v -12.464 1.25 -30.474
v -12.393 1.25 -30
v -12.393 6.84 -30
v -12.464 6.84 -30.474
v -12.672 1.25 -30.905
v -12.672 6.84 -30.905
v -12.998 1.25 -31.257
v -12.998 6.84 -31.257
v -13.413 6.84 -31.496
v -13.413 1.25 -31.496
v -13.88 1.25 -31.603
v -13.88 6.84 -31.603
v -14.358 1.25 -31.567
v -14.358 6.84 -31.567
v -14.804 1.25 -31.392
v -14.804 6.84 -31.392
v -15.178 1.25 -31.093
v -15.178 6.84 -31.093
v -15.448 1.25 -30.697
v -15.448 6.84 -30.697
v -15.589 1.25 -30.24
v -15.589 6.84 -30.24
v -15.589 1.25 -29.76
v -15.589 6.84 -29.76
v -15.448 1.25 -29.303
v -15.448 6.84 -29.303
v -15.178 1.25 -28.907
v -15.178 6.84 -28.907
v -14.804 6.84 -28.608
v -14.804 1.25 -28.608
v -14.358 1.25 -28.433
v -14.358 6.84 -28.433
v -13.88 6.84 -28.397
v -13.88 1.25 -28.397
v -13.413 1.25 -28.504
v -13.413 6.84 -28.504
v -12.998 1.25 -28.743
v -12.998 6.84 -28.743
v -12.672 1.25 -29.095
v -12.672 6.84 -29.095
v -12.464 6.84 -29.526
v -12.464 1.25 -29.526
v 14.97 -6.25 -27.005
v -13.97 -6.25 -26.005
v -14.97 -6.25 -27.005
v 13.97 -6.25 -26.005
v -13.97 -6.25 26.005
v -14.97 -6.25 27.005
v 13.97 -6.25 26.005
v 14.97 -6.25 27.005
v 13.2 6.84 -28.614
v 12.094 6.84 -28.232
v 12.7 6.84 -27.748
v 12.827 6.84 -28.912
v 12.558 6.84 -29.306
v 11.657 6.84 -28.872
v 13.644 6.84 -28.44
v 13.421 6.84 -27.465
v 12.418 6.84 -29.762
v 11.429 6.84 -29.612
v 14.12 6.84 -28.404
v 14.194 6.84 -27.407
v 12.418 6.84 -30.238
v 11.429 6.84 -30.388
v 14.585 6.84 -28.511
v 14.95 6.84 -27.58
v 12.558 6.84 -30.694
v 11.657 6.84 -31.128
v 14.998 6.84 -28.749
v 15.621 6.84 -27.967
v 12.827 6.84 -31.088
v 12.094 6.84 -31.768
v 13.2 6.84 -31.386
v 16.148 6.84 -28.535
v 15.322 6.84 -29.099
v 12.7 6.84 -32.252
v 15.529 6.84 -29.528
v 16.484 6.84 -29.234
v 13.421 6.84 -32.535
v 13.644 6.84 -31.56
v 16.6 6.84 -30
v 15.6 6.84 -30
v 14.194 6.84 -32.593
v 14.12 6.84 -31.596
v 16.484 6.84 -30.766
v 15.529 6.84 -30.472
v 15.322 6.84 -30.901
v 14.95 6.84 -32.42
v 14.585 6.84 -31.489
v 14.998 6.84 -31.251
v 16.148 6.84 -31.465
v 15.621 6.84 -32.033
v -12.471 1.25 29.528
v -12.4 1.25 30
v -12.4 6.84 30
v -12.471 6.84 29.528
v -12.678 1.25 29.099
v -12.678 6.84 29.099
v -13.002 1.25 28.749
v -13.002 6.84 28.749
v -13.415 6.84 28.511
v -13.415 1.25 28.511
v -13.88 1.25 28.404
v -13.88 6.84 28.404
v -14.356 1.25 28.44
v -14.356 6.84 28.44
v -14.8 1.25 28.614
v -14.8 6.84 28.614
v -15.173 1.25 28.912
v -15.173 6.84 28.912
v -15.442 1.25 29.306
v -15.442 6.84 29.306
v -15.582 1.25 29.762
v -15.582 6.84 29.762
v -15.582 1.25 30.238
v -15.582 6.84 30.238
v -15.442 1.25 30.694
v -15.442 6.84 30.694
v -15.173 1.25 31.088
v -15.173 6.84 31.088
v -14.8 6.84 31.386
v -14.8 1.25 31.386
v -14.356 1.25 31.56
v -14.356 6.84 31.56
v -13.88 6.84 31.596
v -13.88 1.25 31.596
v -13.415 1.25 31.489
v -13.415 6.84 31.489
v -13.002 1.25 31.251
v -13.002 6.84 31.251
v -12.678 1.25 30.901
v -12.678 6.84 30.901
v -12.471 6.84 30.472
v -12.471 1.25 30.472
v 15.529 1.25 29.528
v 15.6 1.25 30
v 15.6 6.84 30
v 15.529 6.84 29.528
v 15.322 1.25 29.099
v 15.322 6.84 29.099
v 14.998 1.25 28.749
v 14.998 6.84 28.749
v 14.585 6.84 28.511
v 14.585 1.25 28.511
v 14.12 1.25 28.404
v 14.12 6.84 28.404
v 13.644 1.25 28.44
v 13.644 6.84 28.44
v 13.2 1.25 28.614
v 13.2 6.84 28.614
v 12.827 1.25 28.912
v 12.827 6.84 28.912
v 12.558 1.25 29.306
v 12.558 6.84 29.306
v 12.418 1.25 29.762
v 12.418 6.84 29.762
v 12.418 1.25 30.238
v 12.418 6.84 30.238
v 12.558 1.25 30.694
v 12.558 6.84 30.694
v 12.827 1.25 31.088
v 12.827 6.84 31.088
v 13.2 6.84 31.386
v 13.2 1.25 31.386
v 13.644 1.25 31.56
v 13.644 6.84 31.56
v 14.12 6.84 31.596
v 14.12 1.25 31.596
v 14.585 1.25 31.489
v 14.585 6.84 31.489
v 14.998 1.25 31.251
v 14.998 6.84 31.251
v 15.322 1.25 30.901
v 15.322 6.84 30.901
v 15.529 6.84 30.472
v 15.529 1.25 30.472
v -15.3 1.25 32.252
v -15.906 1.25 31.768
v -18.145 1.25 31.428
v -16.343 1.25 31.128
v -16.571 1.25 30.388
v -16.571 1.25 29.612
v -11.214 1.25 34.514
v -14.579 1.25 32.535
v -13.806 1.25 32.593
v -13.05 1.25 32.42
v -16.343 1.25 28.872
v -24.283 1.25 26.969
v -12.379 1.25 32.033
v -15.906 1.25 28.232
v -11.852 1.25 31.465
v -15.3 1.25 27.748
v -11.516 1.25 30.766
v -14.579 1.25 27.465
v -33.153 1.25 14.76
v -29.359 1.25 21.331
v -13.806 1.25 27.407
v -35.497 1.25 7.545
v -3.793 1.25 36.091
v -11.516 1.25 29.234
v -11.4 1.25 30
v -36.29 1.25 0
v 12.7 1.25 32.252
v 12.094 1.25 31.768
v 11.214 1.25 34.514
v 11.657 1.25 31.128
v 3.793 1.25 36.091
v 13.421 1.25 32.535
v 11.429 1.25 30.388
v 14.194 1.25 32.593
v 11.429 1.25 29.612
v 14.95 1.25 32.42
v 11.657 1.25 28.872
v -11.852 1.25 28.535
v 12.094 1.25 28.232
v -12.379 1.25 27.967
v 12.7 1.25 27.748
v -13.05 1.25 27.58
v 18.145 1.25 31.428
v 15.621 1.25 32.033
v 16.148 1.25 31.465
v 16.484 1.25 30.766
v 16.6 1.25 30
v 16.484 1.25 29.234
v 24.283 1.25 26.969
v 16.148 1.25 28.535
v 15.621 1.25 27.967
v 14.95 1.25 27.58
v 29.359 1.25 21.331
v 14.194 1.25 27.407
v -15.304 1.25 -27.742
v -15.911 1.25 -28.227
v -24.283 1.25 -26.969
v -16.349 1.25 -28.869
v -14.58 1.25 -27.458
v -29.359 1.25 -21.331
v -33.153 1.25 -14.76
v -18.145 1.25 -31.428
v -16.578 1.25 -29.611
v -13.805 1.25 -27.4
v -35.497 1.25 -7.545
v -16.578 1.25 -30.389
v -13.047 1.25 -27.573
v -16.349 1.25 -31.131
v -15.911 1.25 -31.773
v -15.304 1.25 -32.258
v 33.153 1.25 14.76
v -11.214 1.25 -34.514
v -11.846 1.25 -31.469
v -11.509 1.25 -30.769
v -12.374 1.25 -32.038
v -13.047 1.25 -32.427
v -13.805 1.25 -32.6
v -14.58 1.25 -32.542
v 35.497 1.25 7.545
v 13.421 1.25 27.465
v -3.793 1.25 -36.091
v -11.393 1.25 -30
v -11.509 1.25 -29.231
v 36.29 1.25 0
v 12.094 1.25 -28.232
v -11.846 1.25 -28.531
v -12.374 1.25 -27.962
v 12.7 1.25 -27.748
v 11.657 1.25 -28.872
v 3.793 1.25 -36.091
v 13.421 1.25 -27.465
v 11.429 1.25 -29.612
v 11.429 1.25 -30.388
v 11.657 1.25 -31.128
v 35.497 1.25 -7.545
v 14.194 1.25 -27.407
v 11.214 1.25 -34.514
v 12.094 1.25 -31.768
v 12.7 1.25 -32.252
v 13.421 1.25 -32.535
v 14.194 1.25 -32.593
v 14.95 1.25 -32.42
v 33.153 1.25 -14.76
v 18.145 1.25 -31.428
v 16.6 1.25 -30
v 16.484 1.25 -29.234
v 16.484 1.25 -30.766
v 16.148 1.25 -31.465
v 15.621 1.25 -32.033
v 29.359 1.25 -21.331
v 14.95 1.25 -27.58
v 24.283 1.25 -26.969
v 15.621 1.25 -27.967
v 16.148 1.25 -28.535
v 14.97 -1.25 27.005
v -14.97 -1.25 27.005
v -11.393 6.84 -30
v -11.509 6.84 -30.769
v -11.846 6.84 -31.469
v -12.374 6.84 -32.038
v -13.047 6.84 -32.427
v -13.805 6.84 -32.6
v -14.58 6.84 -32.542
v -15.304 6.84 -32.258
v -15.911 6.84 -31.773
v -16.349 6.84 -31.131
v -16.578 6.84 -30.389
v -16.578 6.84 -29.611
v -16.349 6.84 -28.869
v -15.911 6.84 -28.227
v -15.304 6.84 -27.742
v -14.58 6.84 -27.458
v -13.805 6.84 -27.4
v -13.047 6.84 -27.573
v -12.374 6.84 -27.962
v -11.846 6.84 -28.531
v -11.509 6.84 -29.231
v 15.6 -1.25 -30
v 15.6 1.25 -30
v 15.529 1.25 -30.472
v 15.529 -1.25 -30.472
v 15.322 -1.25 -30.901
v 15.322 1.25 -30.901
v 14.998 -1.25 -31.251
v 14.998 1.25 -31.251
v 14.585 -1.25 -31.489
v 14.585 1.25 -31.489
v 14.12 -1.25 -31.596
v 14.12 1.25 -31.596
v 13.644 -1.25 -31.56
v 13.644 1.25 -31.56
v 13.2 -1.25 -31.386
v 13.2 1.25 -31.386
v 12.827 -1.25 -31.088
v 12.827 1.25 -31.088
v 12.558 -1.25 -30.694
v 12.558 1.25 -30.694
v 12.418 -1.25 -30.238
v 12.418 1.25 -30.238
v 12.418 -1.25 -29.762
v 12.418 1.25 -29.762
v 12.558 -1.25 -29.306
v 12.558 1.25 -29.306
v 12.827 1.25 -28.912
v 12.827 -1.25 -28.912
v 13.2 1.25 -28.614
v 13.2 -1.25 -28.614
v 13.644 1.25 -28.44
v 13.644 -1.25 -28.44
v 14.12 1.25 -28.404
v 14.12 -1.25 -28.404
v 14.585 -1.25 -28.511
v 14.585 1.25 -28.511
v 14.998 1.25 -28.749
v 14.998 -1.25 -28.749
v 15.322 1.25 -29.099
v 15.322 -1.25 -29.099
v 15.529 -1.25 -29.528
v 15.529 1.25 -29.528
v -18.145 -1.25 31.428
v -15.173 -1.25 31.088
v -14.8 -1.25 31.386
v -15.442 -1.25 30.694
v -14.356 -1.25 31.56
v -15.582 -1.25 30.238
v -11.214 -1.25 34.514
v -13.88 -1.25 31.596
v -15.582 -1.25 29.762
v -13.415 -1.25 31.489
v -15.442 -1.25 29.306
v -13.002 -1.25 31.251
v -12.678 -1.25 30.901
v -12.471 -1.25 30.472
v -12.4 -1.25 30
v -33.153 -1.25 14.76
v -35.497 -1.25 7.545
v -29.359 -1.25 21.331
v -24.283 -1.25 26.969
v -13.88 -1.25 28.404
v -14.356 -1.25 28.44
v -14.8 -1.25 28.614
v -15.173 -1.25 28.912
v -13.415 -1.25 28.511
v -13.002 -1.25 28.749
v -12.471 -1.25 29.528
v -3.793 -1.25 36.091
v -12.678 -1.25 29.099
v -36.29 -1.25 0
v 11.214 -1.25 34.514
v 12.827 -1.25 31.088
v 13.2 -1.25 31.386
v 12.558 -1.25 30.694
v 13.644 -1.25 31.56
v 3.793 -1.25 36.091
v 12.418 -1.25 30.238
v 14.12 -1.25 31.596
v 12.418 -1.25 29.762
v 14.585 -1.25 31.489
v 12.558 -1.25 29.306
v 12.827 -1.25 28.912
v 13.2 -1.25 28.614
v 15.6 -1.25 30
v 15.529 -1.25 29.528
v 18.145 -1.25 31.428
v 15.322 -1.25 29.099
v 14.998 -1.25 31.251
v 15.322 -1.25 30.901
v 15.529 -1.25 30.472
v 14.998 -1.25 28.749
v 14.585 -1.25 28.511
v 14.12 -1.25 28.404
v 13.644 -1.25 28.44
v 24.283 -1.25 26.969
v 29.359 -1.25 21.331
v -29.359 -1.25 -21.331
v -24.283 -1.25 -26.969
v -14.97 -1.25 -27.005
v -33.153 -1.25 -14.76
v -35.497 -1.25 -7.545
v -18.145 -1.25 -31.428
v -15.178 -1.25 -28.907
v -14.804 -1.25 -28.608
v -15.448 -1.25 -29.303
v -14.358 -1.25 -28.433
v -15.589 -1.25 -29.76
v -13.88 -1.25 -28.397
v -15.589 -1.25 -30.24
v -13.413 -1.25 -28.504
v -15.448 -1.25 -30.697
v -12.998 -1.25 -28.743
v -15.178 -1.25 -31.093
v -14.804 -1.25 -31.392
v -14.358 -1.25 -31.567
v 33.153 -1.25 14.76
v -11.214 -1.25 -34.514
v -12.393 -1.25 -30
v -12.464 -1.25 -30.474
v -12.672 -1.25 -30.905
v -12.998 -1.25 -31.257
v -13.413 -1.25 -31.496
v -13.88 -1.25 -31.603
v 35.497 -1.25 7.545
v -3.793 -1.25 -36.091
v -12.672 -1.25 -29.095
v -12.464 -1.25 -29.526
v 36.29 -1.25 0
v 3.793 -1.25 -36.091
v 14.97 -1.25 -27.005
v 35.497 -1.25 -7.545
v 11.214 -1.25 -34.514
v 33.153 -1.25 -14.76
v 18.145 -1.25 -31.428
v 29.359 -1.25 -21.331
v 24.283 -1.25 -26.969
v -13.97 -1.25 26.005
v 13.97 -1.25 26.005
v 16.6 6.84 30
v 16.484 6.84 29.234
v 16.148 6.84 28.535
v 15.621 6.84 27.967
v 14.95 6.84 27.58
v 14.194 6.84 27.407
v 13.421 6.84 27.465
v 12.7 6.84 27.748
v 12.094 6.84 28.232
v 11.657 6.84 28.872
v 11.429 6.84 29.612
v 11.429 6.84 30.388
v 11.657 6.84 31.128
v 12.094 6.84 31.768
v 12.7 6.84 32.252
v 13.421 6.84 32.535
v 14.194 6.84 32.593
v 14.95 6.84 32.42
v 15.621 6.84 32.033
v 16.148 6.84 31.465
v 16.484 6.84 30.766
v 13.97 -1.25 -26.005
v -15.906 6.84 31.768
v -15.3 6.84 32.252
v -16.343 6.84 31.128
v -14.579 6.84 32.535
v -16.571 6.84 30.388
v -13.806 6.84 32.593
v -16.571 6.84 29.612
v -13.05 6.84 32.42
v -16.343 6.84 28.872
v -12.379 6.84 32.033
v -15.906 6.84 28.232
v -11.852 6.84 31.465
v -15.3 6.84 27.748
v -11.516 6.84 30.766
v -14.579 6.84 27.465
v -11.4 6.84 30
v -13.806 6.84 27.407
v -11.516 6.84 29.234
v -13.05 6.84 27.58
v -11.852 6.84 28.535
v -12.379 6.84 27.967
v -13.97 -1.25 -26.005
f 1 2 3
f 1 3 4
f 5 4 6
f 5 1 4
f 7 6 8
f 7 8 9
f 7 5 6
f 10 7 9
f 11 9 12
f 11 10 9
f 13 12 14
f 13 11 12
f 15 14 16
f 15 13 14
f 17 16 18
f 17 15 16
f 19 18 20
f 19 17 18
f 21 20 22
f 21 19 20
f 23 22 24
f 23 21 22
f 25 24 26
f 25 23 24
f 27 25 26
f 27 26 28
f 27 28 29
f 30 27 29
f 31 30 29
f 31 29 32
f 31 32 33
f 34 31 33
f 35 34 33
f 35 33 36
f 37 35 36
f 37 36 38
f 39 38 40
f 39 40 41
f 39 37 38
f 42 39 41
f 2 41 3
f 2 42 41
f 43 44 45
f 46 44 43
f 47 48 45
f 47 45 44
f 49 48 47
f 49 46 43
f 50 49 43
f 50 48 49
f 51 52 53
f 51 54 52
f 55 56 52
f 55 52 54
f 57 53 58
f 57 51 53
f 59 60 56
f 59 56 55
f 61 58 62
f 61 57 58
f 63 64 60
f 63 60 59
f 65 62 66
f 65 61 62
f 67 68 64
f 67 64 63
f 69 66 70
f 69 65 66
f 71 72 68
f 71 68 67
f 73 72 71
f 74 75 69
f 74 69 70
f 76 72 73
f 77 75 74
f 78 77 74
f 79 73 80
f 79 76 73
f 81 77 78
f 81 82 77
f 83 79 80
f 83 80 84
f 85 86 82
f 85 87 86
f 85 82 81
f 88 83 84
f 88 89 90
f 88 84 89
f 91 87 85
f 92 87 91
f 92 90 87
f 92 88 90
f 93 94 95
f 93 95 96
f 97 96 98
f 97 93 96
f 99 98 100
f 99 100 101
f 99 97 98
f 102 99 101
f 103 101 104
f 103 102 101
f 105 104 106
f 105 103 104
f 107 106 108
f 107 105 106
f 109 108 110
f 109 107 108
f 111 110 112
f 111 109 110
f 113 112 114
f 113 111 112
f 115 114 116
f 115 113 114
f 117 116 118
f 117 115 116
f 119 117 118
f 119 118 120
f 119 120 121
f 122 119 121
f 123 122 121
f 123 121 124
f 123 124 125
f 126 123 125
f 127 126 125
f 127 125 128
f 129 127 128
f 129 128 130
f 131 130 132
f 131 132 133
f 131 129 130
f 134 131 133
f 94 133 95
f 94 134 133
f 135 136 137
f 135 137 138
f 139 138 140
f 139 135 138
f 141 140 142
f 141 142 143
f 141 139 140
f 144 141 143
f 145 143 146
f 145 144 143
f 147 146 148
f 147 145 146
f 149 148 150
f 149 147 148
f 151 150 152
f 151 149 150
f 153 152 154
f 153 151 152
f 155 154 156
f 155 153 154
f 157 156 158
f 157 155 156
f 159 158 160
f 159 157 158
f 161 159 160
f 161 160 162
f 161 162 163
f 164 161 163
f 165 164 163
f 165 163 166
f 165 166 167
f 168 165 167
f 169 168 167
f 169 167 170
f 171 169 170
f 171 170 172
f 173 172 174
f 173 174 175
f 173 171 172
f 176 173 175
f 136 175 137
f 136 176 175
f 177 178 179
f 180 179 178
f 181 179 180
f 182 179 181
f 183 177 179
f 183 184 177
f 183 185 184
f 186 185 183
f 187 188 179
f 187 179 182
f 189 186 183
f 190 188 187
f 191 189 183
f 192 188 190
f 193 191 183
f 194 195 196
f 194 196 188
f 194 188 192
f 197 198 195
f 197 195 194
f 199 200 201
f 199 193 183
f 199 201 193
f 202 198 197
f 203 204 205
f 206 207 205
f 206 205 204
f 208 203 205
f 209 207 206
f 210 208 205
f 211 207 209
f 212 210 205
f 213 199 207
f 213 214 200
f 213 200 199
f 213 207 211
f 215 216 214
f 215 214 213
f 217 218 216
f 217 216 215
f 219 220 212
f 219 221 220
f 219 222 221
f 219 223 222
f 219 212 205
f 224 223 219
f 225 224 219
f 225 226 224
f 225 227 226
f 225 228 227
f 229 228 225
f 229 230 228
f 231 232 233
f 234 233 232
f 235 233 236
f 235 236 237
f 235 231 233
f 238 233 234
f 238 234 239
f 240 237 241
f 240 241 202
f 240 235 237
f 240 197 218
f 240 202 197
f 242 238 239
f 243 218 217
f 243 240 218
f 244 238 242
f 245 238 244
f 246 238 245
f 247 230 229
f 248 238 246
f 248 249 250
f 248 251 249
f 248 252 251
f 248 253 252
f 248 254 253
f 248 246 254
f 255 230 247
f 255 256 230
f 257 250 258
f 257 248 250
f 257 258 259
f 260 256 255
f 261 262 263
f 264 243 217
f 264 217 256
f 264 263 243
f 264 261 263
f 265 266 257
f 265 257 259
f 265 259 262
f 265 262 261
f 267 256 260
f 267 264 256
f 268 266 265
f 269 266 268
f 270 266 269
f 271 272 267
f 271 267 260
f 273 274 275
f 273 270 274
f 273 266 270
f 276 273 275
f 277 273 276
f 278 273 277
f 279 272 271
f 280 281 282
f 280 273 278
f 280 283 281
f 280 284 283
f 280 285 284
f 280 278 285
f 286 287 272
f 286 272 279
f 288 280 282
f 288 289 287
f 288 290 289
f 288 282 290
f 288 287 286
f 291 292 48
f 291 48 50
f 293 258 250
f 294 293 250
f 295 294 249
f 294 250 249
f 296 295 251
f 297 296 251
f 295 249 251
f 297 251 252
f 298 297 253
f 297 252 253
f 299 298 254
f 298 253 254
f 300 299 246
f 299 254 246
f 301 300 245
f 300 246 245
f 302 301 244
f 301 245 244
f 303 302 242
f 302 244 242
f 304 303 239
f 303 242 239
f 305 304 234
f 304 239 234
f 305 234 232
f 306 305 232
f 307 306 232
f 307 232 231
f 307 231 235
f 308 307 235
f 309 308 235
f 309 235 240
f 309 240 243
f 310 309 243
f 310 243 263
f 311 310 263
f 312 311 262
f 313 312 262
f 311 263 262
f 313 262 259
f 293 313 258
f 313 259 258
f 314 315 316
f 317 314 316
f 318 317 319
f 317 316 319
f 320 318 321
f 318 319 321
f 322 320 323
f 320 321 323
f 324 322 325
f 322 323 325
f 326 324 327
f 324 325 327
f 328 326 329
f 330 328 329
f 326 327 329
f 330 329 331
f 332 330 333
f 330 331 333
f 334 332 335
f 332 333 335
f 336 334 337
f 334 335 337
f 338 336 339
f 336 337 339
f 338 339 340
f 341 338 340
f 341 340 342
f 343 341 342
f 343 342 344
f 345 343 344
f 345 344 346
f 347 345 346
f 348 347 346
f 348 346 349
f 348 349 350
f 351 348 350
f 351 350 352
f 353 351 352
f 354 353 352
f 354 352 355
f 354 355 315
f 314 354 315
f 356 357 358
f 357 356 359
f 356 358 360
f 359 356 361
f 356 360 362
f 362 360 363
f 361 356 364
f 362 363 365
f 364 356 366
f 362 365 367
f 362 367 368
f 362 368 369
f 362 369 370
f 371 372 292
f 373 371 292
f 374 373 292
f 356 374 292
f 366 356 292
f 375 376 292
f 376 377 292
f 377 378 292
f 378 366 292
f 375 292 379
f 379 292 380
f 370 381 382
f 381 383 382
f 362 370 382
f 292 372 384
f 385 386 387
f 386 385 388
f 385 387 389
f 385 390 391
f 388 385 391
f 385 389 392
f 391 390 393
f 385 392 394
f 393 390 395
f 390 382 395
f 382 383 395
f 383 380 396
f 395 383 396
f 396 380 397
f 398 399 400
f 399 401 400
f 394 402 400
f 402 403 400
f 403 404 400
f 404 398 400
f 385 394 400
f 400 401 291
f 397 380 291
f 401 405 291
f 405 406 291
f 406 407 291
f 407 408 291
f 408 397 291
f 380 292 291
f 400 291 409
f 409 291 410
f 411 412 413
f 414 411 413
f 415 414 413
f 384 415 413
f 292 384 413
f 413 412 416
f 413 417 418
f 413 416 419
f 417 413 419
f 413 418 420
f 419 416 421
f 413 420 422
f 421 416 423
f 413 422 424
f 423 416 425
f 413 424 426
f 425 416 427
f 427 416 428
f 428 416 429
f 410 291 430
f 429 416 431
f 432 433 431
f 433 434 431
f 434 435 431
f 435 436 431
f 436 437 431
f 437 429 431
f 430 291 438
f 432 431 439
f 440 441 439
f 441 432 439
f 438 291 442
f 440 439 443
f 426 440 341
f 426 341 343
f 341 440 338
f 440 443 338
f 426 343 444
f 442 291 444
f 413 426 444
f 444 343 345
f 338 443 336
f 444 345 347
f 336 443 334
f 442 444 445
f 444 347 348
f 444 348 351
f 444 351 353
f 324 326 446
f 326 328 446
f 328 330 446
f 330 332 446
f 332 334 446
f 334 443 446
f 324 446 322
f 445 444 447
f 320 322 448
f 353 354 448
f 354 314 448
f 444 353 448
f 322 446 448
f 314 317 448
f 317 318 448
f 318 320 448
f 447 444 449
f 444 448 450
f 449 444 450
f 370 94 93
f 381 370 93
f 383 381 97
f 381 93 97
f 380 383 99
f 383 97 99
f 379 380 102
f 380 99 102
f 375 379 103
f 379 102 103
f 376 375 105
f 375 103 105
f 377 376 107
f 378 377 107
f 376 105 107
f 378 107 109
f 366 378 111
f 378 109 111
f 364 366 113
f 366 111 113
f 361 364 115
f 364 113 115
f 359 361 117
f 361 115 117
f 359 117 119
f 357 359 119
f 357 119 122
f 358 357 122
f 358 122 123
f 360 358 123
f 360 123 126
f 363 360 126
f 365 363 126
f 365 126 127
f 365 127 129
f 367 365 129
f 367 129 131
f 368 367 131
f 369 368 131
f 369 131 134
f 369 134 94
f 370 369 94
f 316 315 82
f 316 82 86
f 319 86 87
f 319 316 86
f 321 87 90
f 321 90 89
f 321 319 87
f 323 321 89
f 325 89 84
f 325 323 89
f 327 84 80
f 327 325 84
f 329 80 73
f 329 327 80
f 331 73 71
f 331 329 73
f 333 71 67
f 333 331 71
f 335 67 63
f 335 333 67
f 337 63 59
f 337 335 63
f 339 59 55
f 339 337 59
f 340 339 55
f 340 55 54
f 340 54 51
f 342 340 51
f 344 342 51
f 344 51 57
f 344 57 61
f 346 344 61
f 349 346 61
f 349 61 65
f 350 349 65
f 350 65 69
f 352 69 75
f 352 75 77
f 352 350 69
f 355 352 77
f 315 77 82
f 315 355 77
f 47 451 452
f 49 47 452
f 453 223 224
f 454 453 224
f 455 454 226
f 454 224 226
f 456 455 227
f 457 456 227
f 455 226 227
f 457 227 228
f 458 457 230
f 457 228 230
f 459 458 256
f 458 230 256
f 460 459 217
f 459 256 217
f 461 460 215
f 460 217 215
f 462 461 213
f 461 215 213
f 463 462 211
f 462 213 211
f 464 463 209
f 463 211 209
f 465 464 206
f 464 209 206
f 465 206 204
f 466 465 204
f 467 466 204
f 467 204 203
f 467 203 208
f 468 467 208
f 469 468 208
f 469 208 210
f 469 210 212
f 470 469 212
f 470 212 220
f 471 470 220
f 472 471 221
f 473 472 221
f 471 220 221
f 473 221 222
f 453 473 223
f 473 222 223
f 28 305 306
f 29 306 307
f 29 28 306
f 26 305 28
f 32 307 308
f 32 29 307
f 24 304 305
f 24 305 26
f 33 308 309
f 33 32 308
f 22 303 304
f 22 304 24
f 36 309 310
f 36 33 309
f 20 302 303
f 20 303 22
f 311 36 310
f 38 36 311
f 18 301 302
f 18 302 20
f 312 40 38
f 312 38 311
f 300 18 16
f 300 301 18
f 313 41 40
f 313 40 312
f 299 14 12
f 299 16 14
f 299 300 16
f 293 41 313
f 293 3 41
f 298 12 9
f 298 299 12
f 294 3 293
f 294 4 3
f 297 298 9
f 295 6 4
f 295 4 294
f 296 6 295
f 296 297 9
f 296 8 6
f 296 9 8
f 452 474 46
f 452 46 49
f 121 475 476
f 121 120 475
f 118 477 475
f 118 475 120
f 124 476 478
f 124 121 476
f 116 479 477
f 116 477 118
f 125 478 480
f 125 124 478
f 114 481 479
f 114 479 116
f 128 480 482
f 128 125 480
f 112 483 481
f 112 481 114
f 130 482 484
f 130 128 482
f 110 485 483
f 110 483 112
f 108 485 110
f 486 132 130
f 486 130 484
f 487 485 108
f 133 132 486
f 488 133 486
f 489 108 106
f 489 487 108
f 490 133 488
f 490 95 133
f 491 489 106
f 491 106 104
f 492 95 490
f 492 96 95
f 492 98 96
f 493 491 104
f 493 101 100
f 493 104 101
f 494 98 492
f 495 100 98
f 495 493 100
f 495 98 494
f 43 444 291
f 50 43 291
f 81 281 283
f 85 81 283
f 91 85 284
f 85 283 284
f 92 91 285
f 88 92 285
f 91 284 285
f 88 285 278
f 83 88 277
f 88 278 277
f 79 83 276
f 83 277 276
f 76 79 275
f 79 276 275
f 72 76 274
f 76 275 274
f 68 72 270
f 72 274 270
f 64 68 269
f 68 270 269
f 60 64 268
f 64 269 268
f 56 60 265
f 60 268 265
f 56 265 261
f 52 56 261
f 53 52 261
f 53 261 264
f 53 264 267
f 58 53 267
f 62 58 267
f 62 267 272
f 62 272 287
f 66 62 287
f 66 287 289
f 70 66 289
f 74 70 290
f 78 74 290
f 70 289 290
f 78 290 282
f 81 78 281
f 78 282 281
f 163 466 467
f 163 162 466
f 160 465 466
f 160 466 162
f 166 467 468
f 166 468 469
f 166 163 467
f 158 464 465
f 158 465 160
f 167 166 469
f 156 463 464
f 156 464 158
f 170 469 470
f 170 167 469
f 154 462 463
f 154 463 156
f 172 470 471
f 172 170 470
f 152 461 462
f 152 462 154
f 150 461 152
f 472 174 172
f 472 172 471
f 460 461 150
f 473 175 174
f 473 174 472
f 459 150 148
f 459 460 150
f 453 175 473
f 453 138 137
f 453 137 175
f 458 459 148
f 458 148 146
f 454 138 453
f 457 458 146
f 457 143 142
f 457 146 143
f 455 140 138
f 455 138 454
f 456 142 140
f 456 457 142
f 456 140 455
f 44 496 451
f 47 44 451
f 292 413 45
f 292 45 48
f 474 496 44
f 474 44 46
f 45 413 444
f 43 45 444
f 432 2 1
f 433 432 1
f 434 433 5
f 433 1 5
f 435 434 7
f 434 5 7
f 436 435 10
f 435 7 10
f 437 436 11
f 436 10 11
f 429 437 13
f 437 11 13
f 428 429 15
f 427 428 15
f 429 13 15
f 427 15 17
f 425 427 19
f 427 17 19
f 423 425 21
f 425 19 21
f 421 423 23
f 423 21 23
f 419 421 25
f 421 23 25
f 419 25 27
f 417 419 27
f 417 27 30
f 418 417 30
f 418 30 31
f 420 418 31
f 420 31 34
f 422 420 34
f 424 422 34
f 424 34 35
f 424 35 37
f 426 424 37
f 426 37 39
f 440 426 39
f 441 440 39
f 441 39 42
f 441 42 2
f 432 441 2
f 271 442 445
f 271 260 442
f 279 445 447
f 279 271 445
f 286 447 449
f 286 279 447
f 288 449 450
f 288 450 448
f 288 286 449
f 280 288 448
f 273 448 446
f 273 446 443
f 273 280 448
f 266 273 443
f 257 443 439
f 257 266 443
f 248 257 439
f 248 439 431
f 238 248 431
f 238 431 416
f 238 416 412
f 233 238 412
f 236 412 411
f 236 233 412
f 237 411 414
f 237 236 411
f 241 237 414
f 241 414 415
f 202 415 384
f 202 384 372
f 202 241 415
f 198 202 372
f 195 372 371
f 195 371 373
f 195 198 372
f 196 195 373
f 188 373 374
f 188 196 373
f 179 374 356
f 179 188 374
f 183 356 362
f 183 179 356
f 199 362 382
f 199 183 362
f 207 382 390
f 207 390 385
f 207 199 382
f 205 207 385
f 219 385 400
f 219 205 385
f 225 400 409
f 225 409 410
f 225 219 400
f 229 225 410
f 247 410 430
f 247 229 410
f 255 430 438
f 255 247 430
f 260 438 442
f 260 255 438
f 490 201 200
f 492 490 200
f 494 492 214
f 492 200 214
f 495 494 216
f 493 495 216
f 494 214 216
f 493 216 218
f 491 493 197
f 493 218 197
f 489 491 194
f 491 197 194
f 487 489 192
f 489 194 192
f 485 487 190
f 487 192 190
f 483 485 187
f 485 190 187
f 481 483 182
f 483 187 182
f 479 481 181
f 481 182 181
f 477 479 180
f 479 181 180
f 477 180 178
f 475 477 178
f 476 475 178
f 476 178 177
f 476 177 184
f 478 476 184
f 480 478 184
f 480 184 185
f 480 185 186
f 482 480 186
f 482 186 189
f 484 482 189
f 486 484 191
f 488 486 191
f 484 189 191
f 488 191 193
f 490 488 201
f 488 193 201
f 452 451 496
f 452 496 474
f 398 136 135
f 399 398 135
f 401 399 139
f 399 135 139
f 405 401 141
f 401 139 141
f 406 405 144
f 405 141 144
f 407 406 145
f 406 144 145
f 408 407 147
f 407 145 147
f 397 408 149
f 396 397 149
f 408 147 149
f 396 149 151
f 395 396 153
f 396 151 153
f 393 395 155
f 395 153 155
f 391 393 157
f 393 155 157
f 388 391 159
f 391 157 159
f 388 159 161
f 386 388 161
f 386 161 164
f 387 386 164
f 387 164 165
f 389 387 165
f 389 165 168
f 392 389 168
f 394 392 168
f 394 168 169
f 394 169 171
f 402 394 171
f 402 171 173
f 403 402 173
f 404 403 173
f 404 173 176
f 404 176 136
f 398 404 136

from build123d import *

# Parameters (mm, degrees)
CROQUIS1_R              = 36.29
SALIENTE_EXTRUIR1_DEPTH = 1.25
CROQUIS2_W              = 29.94
CROQUIS2_H              = 54.01
CROQUIS2_W_2            = 27.94
CROQUIS2_H_2            = 52.01
SALIENTE_EXTRUIR2_DEPTH = 5
CROQUIS3_R              = 2.60731142
CROQUIS3_R_2            = 1.60731142
CROQUIS3_R_3            = 2.6
CROQUIS3_R_4            = 1.6
CROQUIS3_R_5            = 2.600000001
CROQUIS3_R_6            = 1.600000001
SALIENTE_EXTRUIR3_DEPTH = 5.59
CROQUIS3_3_R            = 1.6
CROQUIS3_3_R_2          = 1.600000001
CROQUIS3_3_R_3          = 1.60731142
CORTAR_EXTRUIR1_DEPTH   = 52.866927806


with BuildPart() as part:
    # Croquis1 → Saliente-Extruir1 (new, symmetric)
    with BuildSketch(Plane(origin=(0, 0, 0), x_dir=(1, 0, 0), z_dir=(0, 1, 0))):
        Circle(CROQUIS1_R)
    extrude(amount=SALIENTE_EXTRUIR1_DEPTH, both=True)

    # Croquis2 → Saliente-Extruir2 (add)
    with BuildSketch(Plane.XZ.offset(1.25)):
        Rectangle(CROQUIS2_W, CROQUIS2_H)
        Rectangle(CROQUIS2_W_2, CROQUIS2_H_2, mode=Mode.SUBTRACT)
    extrude(amount=SALIENTE_EXTRUIR2_DEPTH)

    # Croquis3 → Saliente-Extruir3 (add)
    # profile 1 of 4: a face of its own
    with BuildSketch(Plane(origin=(0, 1.25, 0), x_dir=(1, 0, 0), z_dir=(0, 1, 0))):
        with Locations((-14, 30)):
            Circle(CROQUIS3_R)
        with Locations((-14, 30)):
            Circle(CROQUIS3_R_2, mode=Mode.SUBTRACT)
    # profile 2 of 4: a face of its own
    with BuildSketch(Plane(origin=(0, 1.25, 0), x_dir=(1, 0, 0), z_dir=(0, 1, 0))):
        with Locations((14, 30)):
            Circle(CROQUIS3_R_3)
        with Locations((14, 30)):
            Circle(CROQUIS3_R_4, mode=Mode.SUBTRACT)
    # profile 3 of 4: a face of its own
    with BuildSketch(Plane(origin=(0, 1.25, 0), x_dir=(1, 0, 0), z_dir=(0, 1, 0))):
        with Locations((-14.000000001, -30)):
            Circle(CROQUIS3_R_5)
        with Locations((-14.000000001, -30)):
            Circle(CROQUIS3_R_6, mode=Mode.SUBTRACT)
    # profile 4 of 4: a face of its own
    with BuildSketch(Plane(origin=(0, 1.25, 0), x_dir=(1, 0, 0), z_dir=(0, 1, 0))):
        with Locations((13.999999999, -30)):
            Circle(CROQUIS3_R_5)
        with Locations((13.999999999, -30)):
            Circle(CROQUIS3_R_6, mode=Mode.SUBTRACT)
    extrude(amount=SALIENTE_EXTRUIR3_DEPTH)

    # Croquis3<3> → Cortar-Extruir1 (cut, through all)
    with BuildSketch(Plane(origin=(0, 1.25, 0), x_dir=(1, 0, 0), z_dir=(0, 1, 0))):
        with Locations((14, 30)):
            Circle(CROQUIS3_3_R)
        with Locations((13.999999999, -30)):
            Circle(CROQUIS3_3_R_2)
        with Locations((-14.000000001, -30)):
            Circle(CROQUIS3_3_R_2)
        with Locations((-14, 30)):
            Circle(CROQUIS3_3_R_3)
    extrude(amount=-CORTAR_EXTRUIR1_DEPTH, mode=Mode.SUBTRACT)


solid = part.part
